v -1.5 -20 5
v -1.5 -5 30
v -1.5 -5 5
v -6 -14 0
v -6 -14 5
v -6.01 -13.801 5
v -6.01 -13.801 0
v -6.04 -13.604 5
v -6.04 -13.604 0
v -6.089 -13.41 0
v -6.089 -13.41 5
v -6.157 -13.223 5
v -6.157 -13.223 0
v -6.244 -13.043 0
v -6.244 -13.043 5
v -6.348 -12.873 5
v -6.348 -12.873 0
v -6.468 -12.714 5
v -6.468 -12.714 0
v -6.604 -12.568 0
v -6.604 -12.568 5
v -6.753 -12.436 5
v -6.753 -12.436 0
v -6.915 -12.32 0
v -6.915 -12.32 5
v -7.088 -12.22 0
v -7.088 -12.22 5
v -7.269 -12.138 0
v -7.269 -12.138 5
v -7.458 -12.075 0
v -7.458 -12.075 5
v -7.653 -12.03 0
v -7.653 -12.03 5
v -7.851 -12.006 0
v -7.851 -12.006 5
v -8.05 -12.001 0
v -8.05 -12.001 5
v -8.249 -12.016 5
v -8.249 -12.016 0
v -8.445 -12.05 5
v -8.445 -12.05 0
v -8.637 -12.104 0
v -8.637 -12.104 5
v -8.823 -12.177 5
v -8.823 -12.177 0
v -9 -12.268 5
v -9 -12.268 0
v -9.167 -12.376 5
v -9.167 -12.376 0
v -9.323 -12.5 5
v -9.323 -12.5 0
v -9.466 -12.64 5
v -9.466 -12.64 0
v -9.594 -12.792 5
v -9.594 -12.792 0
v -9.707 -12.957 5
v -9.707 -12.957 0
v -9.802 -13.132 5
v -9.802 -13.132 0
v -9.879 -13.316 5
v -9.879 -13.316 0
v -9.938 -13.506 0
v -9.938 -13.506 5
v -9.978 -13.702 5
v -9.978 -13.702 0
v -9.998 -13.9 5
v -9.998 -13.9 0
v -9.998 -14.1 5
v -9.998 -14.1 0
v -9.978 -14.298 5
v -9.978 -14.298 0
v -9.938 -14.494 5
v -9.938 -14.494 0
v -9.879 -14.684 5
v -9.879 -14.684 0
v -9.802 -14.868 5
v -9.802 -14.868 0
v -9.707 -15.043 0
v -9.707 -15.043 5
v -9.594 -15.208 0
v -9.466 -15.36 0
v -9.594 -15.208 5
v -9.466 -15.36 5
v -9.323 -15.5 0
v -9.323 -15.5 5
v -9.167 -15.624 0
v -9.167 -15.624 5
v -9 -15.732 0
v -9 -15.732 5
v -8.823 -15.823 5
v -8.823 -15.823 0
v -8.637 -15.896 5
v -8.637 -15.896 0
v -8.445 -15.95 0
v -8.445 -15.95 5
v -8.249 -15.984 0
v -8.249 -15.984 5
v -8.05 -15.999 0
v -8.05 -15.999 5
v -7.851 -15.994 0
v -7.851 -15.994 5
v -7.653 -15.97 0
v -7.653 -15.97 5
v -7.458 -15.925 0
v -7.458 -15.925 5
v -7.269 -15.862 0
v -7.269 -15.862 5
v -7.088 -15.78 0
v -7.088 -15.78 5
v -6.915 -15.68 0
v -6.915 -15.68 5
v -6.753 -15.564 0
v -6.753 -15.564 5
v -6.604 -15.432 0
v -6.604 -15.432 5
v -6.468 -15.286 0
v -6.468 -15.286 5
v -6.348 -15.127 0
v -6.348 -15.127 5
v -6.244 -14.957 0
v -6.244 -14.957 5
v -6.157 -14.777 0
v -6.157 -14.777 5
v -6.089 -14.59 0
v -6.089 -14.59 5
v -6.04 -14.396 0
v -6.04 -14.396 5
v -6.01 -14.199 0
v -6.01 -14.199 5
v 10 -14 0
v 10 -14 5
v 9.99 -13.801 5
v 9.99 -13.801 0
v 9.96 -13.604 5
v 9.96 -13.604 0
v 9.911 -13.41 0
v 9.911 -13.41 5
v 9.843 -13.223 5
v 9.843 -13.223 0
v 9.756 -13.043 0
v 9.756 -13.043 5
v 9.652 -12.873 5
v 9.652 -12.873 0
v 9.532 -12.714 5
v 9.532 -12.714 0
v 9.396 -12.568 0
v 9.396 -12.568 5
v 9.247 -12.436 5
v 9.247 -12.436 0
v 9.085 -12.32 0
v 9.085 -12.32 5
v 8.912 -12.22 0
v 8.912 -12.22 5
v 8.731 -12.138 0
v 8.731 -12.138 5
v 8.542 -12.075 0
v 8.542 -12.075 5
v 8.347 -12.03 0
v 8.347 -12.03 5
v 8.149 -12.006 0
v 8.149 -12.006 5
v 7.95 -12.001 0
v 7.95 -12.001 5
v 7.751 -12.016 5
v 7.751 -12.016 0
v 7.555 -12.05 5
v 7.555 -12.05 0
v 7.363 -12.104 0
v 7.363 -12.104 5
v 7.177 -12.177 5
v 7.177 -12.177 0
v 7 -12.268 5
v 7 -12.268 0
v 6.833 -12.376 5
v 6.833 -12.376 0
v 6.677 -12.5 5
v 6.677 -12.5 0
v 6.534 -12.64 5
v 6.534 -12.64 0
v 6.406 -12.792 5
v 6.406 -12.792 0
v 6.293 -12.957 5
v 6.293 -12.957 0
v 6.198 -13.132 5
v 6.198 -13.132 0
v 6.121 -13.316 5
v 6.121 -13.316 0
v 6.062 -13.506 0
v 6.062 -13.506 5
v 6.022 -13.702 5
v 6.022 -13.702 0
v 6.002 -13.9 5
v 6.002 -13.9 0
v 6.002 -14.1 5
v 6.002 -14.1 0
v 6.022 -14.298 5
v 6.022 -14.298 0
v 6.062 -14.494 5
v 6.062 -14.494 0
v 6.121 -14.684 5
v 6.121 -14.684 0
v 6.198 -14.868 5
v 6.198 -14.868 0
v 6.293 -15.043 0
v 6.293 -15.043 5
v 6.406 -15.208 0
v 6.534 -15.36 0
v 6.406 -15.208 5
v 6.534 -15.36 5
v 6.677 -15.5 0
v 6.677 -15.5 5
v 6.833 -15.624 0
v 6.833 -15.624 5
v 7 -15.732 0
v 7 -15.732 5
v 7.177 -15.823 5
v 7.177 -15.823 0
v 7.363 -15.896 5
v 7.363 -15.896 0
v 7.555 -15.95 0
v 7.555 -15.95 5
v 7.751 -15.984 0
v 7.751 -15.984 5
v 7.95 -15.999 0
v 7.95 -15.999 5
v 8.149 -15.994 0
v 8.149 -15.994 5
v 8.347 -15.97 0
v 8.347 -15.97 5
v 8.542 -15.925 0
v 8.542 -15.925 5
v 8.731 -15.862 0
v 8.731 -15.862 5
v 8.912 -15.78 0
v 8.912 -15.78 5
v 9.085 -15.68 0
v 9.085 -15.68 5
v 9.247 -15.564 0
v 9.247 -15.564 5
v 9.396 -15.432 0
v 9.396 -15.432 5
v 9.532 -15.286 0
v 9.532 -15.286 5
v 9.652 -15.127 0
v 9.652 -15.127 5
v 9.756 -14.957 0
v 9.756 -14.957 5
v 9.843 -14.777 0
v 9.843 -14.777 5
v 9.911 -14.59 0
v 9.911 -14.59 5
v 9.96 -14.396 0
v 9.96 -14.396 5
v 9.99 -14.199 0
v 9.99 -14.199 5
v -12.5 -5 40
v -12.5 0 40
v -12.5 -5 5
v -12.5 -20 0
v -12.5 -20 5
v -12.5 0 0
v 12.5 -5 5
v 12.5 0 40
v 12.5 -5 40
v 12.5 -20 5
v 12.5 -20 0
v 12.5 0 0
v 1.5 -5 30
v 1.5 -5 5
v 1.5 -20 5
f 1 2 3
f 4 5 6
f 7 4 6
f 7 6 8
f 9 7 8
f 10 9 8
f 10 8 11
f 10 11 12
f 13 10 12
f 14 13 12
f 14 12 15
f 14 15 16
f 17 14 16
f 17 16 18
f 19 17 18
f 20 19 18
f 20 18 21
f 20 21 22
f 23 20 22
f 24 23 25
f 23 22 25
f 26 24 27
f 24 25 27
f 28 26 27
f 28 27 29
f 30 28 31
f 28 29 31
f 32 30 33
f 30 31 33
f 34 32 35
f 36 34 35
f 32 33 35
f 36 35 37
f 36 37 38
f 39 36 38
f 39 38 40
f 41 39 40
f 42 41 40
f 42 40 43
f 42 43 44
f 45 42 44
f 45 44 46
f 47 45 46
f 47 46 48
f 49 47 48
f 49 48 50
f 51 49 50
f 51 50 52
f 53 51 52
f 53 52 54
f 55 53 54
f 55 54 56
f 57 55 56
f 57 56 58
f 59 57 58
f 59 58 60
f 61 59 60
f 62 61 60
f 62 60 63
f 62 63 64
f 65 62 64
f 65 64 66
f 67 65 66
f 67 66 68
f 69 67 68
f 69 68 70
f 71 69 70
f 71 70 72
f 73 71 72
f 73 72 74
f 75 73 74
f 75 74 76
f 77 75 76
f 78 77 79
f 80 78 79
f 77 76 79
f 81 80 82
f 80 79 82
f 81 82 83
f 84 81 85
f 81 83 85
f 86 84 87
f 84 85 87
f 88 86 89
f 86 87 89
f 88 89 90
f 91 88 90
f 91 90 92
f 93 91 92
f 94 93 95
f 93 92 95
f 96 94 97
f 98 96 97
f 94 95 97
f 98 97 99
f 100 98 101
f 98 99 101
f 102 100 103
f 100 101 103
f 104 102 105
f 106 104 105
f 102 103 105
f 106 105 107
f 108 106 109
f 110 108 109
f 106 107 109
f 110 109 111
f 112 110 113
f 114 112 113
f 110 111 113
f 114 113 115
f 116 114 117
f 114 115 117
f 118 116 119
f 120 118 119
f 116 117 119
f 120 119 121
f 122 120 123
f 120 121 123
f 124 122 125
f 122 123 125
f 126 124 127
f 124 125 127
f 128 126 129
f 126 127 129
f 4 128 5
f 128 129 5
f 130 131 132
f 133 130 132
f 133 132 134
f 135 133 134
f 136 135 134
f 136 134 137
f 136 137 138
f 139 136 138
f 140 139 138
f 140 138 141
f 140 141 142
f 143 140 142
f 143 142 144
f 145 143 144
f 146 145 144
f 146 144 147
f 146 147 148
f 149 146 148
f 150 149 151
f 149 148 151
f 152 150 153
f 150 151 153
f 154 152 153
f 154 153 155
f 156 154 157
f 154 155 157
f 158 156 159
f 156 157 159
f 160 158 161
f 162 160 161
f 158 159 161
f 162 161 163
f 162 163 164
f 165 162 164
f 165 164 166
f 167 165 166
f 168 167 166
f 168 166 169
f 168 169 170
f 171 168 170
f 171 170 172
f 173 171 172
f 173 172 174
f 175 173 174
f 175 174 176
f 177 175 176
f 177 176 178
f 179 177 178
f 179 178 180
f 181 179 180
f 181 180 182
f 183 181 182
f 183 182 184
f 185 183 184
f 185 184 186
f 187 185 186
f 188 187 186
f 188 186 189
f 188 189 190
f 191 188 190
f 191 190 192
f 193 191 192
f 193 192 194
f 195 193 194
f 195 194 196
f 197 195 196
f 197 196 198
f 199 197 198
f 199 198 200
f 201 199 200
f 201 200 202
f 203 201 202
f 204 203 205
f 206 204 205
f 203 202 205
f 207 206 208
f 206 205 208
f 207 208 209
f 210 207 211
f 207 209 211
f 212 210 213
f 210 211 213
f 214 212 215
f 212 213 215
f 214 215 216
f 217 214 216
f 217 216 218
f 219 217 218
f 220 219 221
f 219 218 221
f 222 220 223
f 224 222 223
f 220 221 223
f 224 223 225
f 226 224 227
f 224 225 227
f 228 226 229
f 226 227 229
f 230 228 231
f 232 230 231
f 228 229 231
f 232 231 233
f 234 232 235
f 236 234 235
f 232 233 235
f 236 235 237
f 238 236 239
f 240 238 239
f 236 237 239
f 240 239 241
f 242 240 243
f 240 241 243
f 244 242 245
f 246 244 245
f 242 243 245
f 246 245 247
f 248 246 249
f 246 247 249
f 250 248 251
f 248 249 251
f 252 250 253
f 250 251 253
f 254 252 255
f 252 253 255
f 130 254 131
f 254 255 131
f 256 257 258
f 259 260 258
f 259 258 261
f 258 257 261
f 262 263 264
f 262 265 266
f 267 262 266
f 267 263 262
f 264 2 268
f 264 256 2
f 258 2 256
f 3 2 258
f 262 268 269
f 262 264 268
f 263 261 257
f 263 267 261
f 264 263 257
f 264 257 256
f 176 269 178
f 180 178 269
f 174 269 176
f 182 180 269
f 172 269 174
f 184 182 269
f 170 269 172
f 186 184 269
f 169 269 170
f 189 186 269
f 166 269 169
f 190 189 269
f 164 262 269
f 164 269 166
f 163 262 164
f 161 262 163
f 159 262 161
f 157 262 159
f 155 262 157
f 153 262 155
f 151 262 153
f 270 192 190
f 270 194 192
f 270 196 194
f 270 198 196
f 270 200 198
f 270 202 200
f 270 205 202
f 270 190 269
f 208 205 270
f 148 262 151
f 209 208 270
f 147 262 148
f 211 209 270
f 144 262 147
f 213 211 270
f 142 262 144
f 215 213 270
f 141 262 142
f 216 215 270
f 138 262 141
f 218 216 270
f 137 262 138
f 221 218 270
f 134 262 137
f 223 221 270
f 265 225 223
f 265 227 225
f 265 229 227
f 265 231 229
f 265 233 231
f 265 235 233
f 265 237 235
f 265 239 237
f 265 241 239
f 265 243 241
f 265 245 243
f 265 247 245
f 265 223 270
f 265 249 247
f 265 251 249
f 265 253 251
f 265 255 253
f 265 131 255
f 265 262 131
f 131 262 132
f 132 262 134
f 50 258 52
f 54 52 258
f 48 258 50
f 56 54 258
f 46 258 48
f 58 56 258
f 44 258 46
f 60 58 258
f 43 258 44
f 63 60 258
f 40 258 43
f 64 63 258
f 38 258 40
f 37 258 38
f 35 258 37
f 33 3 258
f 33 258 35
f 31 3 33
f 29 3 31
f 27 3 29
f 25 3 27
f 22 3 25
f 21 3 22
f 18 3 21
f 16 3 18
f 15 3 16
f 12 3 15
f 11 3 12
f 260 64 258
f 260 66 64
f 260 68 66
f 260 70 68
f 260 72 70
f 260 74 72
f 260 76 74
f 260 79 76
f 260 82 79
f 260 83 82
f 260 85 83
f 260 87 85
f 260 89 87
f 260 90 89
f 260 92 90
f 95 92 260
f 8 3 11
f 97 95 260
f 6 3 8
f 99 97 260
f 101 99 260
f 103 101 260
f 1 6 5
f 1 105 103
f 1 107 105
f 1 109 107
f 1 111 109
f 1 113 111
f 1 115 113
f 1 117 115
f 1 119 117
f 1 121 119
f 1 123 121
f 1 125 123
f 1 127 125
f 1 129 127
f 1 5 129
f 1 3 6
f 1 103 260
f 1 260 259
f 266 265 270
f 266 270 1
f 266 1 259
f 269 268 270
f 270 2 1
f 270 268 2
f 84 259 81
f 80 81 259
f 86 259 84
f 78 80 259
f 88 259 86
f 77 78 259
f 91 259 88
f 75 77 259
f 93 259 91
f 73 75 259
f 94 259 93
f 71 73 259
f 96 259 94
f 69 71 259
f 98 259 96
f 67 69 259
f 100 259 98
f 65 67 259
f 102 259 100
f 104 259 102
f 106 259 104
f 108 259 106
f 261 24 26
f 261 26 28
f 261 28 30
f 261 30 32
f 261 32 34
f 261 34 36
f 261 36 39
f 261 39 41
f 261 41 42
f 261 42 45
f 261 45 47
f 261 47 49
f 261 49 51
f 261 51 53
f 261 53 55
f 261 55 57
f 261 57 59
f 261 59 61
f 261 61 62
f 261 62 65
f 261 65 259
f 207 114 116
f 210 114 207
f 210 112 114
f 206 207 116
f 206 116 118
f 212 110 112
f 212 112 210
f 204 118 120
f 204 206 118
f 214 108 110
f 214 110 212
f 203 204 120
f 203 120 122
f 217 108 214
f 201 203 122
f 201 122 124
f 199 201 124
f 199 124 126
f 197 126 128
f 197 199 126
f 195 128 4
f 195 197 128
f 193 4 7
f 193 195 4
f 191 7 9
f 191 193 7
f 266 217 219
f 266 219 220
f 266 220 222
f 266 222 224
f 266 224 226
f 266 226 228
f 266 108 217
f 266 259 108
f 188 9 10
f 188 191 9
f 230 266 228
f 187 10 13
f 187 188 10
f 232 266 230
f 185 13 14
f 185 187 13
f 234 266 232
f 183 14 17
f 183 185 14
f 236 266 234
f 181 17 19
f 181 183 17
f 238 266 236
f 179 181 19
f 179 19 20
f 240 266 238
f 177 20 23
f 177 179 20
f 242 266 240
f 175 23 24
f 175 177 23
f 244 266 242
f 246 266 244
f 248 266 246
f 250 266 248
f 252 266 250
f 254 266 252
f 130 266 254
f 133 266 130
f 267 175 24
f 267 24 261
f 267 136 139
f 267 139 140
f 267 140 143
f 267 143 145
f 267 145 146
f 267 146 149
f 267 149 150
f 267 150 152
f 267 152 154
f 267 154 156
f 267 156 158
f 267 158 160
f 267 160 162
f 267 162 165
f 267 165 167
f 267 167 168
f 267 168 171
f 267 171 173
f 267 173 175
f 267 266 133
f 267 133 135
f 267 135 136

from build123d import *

# Parameters (mm, degrees)
BOSS_EXTRUDE1_DEPTH = 12.5
BOSS_EXTRUDE2_DEPTH = 1.5
SKETCH3_R           = 2
CUT_EXTRUDE1_DEPTH  = 43.20485754


with BuildPart() as part:
    # Sketch1 → Boss-Extrude1 (new, symmetric)
    with BuildSketch(Plane(origin=(0, 0, 0), x_dir=(0, 0, -1), z_dir=(1, 0, 0))):
        Polygon((0, 0), (-40, 0), (-40, -5), (-5, -5), (-5, -20), (0, -20), align=None)
    extrude(amount=BOSS_EXTRUDE1_DEPTH, both=True)

    # Sketch2 → Boss-Extrude2 (add, symmetric)
    with BuildSketch(Plane(origin=(0, 0, 0), x_dir=(0, 0, -1), z_dir=(1, 0, 0))):
        Polygon((-30, -5), (-5, -20), (-5, -5), align=None)
    extrude(amount=BOSS_EXTRUDE2_DEPTH, both=True)

    # Sketch3 → Cut-Extrude1 (cut, through all)
    with BuildSketch(Plane.XY.offset(5)):
        with Locations((8, -14)):
            Circle(SKETCH3_R)
        with Locations((-8, -14)):
            Circle(SKETCH3_R)
    extrude(amount=-CUT_EXTRUDE1_DEPTH, mode=Mode.SUBTRACT)


solid = part.part
